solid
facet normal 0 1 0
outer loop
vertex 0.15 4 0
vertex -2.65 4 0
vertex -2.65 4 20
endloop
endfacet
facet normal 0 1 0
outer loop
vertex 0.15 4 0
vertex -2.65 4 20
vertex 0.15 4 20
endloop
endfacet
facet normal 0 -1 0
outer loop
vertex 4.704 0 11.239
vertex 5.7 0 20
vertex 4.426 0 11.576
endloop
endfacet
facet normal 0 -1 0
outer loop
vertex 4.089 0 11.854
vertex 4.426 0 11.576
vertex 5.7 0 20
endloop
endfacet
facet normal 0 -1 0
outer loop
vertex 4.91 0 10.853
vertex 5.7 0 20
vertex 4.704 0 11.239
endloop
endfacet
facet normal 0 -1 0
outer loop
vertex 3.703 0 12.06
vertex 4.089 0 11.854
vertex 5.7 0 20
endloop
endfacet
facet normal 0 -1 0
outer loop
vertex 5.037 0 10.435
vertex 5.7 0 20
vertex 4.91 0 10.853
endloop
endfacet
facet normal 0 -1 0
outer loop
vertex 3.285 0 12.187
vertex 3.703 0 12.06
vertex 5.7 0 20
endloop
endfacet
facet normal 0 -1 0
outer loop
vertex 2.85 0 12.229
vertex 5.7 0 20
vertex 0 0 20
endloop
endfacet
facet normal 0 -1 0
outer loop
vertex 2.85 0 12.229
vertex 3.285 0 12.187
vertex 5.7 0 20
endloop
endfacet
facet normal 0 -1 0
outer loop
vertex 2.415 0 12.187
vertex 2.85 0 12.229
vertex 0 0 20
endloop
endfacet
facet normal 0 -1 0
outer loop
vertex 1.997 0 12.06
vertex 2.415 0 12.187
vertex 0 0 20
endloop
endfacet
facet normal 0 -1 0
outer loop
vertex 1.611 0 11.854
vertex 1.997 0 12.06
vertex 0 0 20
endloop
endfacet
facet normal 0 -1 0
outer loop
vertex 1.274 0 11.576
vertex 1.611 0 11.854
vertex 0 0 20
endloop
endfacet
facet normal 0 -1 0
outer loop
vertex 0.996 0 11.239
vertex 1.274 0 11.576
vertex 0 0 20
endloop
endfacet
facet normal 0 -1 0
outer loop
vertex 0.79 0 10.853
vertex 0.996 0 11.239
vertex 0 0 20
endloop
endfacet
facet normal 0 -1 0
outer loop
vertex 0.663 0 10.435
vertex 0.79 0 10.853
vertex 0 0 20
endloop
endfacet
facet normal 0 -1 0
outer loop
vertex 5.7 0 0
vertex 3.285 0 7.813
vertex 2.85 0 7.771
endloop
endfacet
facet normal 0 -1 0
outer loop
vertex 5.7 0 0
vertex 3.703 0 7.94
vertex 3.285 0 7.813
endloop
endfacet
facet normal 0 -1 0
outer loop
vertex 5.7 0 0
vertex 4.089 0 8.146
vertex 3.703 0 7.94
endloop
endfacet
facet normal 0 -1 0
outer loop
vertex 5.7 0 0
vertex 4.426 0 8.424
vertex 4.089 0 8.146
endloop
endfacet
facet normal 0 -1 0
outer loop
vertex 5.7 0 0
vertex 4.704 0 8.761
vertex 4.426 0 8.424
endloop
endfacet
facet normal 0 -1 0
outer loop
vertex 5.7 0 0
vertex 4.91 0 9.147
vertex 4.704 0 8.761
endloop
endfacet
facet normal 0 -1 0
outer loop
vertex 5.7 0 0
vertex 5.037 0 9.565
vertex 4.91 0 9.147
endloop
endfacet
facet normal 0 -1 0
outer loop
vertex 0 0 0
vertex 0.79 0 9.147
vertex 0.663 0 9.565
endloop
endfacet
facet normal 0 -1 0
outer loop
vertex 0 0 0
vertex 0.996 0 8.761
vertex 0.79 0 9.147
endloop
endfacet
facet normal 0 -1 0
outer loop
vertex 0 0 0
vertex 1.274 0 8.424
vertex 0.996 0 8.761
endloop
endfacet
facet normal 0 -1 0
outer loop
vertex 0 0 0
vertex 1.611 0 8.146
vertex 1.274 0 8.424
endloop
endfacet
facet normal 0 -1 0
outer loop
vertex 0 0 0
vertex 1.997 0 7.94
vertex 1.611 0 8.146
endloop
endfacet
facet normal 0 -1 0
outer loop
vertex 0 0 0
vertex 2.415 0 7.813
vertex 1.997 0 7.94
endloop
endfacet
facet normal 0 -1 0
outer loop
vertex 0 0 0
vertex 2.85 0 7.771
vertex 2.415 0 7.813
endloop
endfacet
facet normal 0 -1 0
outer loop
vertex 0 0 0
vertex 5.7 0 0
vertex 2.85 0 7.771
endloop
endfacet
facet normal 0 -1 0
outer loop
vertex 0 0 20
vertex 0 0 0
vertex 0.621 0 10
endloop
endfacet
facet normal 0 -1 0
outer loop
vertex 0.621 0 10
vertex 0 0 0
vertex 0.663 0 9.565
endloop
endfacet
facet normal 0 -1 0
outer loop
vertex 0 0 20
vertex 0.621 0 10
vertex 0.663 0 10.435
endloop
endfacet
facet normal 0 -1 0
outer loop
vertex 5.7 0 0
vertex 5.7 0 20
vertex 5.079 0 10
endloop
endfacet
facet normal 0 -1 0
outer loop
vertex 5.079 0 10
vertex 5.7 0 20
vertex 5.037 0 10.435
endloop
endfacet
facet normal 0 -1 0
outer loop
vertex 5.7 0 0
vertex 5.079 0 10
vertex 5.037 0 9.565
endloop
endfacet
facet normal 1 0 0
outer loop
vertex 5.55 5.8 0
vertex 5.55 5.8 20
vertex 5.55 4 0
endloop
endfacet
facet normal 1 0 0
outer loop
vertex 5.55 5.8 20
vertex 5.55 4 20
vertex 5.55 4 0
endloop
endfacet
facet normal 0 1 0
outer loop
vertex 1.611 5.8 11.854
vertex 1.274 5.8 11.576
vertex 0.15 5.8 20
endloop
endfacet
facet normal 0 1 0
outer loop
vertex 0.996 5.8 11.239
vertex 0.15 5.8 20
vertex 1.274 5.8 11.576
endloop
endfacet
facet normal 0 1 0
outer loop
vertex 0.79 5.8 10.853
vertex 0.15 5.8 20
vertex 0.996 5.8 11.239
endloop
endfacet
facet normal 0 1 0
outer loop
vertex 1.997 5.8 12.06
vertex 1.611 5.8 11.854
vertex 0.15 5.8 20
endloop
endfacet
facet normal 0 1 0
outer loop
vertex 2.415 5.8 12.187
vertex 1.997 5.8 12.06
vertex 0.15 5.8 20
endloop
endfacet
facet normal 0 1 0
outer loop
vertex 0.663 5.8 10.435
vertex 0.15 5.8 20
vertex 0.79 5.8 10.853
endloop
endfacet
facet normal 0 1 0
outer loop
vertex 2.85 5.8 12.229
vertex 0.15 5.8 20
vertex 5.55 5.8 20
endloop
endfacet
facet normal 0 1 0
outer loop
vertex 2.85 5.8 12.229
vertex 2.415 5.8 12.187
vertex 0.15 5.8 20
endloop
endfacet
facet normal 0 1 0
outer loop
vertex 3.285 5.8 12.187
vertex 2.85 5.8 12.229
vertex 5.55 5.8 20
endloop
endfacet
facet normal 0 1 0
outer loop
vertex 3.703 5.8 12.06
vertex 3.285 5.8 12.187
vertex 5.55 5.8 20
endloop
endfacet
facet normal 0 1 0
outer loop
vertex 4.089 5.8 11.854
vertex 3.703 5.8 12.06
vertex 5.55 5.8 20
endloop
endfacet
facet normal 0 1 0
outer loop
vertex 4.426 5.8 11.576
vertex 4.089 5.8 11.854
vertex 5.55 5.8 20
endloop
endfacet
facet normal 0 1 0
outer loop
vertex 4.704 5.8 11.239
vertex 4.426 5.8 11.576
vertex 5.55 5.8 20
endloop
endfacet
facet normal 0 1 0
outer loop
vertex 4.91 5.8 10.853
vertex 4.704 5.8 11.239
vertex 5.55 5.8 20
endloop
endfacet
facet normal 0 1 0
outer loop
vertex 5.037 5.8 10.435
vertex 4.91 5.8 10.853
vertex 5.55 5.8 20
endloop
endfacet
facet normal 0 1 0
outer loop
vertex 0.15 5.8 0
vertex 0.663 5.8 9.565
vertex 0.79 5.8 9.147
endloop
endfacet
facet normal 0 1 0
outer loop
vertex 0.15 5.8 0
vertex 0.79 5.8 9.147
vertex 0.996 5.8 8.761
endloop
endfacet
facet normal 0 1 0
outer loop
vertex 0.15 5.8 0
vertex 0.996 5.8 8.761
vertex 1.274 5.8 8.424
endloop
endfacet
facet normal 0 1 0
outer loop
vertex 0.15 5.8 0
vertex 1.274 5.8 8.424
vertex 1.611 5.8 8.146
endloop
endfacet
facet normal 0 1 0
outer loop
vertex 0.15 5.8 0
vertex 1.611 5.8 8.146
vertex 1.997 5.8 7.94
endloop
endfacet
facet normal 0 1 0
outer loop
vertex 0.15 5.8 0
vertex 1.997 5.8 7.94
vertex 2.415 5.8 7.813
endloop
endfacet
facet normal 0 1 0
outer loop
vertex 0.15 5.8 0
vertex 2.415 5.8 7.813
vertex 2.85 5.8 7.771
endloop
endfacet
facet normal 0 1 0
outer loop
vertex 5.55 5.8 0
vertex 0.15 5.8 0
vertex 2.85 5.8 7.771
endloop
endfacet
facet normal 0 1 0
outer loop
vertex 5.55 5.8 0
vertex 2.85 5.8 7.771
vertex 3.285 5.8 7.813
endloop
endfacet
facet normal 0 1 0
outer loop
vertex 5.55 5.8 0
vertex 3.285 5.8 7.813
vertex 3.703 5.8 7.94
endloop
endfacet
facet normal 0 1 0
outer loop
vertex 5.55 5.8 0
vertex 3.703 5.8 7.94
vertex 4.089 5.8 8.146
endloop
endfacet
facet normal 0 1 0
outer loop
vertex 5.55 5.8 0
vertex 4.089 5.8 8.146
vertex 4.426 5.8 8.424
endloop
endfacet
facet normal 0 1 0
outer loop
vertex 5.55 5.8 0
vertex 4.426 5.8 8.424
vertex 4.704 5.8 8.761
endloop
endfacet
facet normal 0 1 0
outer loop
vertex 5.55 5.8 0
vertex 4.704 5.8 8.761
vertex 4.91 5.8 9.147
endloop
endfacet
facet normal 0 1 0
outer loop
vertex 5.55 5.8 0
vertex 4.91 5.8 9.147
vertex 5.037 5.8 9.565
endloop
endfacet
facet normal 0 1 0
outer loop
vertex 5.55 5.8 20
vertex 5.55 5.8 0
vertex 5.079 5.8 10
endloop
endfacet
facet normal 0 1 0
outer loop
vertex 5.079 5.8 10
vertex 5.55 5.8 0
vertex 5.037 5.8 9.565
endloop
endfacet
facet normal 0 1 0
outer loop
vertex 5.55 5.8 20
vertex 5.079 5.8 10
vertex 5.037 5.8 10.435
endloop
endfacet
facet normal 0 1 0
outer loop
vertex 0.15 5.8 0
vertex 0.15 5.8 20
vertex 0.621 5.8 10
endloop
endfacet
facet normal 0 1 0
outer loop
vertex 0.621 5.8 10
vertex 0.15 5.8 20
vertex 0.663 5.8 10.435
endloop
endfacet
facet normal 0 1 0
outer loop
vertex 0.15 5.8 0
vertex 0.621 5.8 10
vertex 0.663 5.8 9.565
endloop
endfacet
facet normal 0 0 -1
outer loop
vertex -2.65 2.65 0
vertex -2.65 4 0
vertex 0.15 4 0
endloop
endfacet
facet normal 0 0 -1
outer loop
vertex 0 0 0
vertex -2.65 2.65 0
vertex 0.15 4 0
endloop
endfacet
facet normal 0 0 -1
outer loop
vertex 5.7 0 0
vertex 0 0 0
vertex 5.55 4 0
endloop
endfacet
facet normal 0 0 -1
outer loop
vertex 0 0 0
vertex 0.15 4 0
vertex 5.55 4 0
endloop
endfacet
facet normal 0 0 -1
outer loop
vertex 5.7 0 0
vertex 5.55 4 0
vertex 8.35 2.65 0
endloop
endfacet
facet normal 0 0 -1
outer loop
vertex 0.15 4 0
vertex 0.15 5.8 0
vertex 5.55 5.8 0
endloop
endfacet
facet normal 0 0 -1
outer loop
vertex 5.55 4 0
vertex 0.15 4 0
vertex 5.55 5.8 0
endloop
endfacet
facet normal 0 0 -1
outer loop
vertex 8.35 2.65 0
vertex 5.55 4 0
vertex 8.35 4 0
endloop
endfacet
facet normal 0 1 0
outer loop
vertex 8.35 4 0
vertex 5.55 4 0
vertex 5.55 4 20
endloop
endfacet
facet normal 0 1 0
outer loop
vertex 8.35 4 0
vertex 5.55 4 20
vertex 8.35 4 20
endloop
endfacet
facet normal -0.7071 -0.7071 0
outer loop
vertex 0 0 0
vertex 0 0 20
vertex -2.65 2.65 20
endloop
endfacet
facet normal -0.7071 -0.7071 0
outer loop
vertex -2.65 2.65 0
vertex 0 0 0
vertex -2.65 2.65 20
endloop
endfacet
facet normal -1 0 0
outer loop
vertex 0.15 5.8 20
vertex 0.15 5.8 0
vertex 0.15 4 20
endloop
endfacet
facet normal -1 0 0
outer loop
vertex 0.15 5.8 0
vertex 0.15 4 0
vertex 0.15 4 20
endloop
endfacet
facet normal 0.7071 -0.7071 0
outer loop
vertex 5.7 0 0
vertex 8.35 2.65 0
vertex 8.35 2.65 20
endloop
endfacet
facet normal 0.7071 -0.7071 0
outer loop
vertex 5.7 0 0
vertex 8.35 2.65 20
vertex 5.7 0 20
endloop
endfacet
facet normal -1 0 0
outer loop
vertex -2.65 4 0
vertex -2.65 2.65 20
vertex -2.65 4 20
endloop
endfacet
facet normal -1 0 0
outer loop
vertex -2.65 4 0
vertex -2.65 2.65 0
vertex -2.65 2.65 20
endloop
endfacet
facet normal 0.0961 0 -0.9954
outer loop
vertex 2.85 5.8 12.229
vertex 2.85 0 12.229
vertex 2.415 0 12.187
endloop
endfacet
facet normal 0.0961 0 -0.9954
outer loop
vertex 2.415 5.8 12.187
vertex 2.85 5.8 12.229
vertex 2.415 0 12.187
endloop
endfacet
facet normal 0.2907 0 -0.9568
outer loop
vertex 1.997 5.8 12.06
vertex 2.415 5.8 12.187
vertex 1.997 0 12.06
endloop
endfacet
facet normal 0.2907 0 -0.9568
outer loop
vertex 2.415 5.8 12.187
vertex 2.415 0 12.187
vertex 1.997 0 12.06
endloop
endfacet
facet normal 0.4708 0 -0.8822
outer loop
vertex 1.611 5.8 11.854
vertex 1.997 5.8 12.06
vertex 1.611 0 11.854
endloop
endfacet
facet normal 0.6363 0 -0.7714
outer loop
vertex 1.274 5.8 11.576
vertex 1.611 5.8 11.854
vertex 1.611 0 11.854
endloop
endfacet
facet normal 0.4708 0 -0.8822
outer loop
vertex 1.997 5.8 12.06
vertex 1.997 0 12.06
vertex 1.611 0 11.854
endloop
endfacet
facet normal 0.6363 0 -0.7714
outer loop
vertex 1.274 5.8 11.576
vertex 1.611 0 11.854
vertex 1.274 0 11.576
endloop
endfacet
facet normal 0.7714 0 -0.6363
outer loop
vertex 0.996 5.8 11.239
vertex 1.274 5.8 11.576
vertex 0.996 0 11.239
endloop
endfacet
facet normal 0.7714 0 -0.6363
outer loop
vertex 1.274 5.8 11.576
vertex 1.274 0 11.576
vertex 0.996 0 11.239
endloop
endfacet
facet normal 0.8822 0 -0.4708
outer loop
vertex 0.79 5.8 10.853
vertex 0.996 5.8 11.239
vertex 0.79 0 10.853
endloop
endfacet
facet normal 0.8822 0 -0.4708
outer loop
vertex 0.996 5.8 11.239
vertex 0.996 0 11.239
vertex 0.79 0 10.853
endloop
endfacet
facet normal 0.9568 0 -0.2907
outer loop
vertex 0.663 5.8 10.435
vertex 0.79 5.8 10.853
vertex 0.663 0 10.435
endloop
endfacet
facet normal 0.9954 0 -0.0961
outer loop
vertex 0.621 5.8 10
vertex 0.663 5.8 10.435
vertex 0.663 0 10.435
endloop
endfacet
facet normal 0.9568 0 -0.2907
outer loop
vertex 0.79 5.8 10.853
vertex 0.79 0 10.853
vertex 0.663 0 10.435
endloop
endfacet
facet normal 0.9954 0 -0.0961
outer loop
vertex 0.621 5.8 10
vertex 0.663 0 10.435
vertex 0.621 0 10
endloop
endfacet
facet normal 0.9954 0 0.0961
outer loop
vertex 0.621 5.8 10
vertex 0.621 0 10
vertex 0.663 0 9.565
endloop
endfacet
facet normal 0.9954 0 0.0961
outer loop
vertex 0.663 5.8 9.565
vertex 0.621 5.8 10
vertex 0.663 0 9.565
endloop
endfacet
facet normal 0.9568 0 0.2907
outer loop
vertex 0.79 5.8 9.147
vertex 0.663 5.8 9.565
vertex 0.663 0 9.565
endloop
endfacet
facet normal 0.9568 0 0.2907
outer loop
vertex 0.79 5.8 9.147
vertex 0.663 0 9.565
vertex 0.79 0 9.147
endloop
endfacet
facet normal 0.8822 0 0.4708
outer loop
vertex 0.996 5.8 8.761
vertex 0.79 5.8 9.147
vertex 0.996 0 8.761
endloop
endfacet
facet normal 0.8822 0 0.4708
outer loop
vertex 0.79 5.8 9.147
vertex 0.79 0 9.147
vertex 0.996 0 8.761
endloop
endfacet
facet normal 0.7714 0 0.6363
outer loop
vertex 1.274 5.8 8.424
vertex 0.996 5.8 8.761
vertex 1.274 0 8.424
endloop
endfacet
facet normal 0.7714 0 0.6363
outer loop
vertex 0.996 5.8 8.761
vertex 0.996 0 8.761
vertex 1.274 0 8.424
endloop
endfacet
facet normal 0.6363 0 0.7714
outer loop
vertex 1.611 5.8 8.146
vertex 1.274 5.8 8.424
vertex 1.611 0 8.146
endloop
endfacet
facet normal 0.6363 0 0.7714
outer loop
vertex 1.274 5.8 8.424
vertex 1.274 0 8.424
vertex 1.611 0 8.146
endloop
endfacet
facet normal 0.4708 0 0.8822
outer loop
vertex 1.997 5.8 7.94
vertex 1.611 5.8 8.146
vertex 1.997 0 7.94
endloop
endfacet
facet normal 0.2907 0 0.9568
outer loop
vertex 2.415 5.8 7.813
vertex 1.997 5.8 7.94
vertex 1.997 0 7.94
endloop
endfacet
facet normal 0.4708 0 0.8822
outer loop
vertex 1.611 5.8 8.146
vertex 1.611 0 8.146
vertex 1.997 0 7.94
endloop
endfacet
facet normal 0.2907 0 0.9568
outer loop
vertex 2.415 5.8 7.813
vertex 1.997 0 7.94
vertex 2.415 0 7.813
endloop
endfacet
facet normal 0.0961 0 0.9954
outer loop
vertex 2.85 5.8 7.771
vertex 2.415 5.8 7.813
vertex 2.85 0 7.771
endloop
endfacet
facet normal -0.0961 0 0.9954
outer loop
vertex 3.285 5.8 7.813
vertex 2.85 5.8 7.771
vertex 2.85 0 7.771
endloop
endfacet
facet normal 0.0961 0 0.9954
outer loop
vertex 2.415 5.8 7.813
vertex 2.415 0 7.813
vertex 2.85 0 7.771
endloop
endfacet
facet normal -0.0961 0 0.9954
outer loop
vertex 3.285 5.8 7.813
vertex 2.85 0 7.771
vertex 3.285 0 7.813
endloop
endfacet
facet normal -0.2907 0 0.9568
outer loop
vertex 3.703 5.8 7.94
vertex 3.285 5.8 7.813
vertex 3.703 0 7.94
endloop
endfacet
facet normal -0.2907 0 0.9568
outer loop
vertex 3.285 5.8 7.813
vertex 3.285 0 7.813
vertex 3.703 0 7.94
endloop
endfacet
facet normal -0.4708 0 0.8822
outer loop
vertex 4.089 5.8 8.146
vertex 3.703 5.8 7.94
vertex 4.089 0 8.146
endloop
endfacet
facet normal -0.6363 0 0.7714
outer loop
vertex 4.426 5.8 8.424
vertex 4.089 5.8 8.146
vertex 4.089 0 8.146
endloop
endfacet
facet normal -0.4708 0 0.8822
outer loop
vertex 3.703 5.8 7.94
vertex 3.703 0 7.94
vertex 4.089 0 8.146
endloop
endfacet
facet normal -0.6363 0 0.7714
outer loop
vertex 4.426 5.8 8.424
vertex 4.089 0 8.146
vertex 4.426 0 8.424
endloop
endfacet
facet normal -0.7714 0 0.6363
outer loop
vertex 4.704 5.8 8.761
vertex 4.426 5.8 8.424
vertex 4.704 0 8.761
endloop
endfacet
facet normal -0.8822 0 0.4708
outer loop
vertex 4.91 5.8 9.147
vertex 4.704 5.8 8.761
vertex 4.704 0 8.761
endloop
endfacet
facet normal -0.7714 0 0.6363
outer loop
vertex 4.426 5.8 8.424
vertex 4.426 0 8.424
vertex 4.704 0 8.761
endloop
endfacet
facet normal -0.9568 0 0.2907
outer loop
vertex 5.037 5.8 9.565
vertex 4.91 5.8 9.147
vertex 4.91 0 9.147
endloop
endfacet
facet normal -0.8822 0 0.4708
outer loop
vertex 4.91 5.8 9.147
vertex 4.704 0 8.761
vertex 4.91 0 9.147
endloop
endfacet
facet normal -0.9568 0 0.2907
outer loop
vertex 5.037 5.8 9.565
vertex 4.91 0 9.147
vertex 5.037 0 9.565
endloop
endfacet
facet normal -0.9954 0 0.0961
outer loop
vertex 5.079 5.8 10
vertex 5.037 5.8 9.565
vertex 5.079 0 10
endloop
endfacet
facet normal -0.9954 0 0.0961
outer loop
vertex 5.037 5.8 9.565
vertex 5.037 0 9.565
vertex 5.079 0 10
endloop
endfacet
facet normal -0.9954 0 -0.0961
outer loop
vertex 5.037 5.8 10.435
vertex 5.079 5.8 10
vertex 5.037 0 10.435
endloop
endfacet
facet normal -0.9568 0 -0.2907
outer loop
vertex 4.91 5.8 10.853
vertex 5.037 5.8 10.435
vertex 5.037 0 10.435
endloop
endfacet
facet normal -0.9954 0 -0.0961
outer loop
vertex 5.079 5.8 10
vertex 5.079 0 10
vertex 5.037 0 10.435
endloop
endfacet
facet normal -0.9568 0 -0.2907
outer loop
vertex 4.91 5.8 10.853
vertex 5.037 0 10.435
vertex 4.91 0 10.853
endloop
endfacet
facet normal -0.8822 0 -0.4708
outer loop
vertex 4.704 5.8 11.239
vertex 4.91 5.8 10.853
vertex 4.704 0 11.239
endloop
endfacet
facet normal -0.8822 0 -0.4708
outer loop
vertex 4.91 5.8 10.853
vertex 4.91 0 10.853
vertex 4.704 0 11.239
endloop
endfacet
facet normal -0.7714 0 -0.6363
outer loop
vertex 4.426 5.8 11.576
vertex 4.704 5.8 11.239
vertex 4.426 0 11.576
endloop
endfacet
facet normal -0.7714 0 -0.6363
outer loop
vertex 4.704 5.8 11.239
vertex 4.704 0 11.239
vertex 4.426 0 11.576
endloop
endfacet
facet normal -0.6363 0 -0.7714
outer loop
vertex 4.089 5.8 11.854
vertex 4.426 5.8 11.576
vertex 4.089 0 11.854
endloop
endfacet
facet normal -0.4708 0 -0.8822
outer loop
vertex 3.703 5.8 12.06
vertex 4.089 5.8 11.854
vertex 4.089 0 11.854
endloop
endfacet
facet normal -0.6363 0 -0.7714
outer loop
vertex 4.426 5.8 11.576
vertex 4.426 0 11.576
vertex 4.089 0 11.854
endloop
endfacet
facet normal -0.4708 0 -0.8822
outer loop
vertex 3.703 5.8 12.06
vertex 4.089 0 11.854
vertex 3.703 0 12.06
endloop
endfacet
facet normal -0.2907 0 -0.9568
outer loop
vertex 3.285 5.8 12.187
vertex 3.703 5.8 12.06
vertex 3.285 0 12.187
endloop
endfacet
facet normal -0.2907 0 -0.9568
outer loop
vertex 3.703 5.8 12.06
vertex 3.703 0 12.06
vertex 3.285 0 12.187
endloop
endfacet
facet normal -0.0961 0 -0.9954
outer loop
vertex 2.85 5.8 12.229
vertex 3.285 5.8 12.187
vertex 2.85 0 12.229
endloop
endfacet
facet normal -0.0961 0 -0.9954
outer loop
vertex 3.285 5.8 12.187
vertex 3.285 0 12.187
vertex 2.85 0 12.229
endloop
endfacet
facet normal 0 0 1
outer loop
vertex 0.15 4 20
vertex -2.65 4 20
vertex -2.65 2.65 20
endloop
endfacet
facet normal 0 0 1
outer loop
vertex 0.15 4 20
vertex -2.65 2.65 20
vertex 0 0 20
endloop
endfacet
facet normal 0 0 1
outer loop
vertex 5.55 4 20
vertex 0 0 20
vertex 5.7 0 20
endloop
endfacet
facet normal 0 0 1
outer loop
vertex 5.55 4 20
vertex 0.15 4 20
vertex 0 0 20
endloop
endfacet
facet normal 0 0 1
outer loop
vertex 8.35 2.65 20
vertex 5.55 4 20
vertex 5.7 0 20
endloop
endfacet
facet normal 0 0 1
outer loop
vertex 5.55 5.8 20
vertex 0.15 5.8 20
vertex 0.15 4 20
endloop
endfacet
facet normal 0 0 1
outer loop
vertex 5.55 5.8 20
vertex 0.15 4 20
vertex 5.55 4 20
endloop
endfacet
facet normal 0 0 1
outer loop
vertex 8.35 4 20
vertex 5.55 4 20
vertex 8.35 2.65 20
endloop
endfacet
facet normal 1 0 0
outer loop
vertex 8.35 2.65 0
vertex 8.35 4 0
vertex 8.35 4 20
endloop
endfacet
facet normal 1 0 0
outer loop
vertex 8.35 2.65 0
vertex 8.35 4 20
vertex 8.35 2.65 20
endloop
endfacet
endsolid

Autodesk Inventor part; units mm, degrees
ref_plane "YZ Plane" through (0, 0, 0) normal (1, 0, 0) x (0, 1, 0)
ref_plane "XZ Plane" through (0, 0, 0) normal (0, 1, 0) x (-1, 0, 0)
ref_plane "XY Plane" through (0, 0, 0) normal (0, 0, 1) x (1, 0, 0)
sketch "Boceto1" plane through (0, 0, 0) normal (0, 0, 1) x (1, 0, 0)
  line L0 (0, 0) -> (-2.65, 2.65)
  line L1 (8.35, 2.65) -> (5.7, 0)
  line L2 (8.35, 4) -> (8.35, 2.65)
  line L3 (-2.65, 4) -> (8.35, 4)
  line L4 (-2.65, 2.65) -> (-2.65, 4)
  line L5 (5.7, 0) -> (0, 0)
  dimension "d1" = 11
  dimension "d2" = 5.7
  dimension "d5" = 2.65
  dimension "d6" = 2.65
  dimension "d7" = 4
  dimension "d9" = 45
  dimension "d10" = 45
extrude "Extrusión1" add sketch "Boceto1" along normal blind 20
sketch "Boceto3" plane through (-2.65, 4, 0) normal (0, 1, 0) x (1, 0, 0)
  line L0 (11, 0) -> (0, 0) projected
  line L1 (8.2, 0) -> (2.8, 0)
  line L2 (2.8, 0) -> (2.8, -20)
  line L3 (2.8, -20) -> (8.2, -20)
  line L4 (8.2, -20) -> (8.2, 0)
  line L5 (11, -20) -> (0, -20) projected
  line L6 (11, 0) -> (11, -20) projected
  line L7 (0, 0) -> (0, -20) projected
  point P0 (2.65, 0)
  point P1 (5.5, -20)
  point P2 (2.8, 0)
  dimension "d20" = 2.8
  dimension "d21" = 2.8
extrude "Extrusión2" add sketch "Boceto3" along normal blind 1.8 contours L4 L3 L2 L0
sketch "Boceto4" plane through (-2.65, 5.8, 0) normal (0, 1, 0) x (1, 0, 0)
  line L0 (8.2, 0) -> (2.8, 0) projected
  line L1 (5.5, 0) -> (5.5, -20)
  line L2 (2.8, -20) -> (8.2, -20) projected
  line L3 (2.8, 0) -> (2.8, -20) projected
  line L4 (2.8, -10) -> (5.5, -10)
  point P0 (2.65, 0)
hole "Agujero2" at (2.85, 5.8, 10) direction (0, -1, 0) diameter 4.4587 depth 10 thread size "M5x0.5" class "6H" standard "ANSI Metric M Profile"
properties part number "Pasador" material "Aluminio 6061"
